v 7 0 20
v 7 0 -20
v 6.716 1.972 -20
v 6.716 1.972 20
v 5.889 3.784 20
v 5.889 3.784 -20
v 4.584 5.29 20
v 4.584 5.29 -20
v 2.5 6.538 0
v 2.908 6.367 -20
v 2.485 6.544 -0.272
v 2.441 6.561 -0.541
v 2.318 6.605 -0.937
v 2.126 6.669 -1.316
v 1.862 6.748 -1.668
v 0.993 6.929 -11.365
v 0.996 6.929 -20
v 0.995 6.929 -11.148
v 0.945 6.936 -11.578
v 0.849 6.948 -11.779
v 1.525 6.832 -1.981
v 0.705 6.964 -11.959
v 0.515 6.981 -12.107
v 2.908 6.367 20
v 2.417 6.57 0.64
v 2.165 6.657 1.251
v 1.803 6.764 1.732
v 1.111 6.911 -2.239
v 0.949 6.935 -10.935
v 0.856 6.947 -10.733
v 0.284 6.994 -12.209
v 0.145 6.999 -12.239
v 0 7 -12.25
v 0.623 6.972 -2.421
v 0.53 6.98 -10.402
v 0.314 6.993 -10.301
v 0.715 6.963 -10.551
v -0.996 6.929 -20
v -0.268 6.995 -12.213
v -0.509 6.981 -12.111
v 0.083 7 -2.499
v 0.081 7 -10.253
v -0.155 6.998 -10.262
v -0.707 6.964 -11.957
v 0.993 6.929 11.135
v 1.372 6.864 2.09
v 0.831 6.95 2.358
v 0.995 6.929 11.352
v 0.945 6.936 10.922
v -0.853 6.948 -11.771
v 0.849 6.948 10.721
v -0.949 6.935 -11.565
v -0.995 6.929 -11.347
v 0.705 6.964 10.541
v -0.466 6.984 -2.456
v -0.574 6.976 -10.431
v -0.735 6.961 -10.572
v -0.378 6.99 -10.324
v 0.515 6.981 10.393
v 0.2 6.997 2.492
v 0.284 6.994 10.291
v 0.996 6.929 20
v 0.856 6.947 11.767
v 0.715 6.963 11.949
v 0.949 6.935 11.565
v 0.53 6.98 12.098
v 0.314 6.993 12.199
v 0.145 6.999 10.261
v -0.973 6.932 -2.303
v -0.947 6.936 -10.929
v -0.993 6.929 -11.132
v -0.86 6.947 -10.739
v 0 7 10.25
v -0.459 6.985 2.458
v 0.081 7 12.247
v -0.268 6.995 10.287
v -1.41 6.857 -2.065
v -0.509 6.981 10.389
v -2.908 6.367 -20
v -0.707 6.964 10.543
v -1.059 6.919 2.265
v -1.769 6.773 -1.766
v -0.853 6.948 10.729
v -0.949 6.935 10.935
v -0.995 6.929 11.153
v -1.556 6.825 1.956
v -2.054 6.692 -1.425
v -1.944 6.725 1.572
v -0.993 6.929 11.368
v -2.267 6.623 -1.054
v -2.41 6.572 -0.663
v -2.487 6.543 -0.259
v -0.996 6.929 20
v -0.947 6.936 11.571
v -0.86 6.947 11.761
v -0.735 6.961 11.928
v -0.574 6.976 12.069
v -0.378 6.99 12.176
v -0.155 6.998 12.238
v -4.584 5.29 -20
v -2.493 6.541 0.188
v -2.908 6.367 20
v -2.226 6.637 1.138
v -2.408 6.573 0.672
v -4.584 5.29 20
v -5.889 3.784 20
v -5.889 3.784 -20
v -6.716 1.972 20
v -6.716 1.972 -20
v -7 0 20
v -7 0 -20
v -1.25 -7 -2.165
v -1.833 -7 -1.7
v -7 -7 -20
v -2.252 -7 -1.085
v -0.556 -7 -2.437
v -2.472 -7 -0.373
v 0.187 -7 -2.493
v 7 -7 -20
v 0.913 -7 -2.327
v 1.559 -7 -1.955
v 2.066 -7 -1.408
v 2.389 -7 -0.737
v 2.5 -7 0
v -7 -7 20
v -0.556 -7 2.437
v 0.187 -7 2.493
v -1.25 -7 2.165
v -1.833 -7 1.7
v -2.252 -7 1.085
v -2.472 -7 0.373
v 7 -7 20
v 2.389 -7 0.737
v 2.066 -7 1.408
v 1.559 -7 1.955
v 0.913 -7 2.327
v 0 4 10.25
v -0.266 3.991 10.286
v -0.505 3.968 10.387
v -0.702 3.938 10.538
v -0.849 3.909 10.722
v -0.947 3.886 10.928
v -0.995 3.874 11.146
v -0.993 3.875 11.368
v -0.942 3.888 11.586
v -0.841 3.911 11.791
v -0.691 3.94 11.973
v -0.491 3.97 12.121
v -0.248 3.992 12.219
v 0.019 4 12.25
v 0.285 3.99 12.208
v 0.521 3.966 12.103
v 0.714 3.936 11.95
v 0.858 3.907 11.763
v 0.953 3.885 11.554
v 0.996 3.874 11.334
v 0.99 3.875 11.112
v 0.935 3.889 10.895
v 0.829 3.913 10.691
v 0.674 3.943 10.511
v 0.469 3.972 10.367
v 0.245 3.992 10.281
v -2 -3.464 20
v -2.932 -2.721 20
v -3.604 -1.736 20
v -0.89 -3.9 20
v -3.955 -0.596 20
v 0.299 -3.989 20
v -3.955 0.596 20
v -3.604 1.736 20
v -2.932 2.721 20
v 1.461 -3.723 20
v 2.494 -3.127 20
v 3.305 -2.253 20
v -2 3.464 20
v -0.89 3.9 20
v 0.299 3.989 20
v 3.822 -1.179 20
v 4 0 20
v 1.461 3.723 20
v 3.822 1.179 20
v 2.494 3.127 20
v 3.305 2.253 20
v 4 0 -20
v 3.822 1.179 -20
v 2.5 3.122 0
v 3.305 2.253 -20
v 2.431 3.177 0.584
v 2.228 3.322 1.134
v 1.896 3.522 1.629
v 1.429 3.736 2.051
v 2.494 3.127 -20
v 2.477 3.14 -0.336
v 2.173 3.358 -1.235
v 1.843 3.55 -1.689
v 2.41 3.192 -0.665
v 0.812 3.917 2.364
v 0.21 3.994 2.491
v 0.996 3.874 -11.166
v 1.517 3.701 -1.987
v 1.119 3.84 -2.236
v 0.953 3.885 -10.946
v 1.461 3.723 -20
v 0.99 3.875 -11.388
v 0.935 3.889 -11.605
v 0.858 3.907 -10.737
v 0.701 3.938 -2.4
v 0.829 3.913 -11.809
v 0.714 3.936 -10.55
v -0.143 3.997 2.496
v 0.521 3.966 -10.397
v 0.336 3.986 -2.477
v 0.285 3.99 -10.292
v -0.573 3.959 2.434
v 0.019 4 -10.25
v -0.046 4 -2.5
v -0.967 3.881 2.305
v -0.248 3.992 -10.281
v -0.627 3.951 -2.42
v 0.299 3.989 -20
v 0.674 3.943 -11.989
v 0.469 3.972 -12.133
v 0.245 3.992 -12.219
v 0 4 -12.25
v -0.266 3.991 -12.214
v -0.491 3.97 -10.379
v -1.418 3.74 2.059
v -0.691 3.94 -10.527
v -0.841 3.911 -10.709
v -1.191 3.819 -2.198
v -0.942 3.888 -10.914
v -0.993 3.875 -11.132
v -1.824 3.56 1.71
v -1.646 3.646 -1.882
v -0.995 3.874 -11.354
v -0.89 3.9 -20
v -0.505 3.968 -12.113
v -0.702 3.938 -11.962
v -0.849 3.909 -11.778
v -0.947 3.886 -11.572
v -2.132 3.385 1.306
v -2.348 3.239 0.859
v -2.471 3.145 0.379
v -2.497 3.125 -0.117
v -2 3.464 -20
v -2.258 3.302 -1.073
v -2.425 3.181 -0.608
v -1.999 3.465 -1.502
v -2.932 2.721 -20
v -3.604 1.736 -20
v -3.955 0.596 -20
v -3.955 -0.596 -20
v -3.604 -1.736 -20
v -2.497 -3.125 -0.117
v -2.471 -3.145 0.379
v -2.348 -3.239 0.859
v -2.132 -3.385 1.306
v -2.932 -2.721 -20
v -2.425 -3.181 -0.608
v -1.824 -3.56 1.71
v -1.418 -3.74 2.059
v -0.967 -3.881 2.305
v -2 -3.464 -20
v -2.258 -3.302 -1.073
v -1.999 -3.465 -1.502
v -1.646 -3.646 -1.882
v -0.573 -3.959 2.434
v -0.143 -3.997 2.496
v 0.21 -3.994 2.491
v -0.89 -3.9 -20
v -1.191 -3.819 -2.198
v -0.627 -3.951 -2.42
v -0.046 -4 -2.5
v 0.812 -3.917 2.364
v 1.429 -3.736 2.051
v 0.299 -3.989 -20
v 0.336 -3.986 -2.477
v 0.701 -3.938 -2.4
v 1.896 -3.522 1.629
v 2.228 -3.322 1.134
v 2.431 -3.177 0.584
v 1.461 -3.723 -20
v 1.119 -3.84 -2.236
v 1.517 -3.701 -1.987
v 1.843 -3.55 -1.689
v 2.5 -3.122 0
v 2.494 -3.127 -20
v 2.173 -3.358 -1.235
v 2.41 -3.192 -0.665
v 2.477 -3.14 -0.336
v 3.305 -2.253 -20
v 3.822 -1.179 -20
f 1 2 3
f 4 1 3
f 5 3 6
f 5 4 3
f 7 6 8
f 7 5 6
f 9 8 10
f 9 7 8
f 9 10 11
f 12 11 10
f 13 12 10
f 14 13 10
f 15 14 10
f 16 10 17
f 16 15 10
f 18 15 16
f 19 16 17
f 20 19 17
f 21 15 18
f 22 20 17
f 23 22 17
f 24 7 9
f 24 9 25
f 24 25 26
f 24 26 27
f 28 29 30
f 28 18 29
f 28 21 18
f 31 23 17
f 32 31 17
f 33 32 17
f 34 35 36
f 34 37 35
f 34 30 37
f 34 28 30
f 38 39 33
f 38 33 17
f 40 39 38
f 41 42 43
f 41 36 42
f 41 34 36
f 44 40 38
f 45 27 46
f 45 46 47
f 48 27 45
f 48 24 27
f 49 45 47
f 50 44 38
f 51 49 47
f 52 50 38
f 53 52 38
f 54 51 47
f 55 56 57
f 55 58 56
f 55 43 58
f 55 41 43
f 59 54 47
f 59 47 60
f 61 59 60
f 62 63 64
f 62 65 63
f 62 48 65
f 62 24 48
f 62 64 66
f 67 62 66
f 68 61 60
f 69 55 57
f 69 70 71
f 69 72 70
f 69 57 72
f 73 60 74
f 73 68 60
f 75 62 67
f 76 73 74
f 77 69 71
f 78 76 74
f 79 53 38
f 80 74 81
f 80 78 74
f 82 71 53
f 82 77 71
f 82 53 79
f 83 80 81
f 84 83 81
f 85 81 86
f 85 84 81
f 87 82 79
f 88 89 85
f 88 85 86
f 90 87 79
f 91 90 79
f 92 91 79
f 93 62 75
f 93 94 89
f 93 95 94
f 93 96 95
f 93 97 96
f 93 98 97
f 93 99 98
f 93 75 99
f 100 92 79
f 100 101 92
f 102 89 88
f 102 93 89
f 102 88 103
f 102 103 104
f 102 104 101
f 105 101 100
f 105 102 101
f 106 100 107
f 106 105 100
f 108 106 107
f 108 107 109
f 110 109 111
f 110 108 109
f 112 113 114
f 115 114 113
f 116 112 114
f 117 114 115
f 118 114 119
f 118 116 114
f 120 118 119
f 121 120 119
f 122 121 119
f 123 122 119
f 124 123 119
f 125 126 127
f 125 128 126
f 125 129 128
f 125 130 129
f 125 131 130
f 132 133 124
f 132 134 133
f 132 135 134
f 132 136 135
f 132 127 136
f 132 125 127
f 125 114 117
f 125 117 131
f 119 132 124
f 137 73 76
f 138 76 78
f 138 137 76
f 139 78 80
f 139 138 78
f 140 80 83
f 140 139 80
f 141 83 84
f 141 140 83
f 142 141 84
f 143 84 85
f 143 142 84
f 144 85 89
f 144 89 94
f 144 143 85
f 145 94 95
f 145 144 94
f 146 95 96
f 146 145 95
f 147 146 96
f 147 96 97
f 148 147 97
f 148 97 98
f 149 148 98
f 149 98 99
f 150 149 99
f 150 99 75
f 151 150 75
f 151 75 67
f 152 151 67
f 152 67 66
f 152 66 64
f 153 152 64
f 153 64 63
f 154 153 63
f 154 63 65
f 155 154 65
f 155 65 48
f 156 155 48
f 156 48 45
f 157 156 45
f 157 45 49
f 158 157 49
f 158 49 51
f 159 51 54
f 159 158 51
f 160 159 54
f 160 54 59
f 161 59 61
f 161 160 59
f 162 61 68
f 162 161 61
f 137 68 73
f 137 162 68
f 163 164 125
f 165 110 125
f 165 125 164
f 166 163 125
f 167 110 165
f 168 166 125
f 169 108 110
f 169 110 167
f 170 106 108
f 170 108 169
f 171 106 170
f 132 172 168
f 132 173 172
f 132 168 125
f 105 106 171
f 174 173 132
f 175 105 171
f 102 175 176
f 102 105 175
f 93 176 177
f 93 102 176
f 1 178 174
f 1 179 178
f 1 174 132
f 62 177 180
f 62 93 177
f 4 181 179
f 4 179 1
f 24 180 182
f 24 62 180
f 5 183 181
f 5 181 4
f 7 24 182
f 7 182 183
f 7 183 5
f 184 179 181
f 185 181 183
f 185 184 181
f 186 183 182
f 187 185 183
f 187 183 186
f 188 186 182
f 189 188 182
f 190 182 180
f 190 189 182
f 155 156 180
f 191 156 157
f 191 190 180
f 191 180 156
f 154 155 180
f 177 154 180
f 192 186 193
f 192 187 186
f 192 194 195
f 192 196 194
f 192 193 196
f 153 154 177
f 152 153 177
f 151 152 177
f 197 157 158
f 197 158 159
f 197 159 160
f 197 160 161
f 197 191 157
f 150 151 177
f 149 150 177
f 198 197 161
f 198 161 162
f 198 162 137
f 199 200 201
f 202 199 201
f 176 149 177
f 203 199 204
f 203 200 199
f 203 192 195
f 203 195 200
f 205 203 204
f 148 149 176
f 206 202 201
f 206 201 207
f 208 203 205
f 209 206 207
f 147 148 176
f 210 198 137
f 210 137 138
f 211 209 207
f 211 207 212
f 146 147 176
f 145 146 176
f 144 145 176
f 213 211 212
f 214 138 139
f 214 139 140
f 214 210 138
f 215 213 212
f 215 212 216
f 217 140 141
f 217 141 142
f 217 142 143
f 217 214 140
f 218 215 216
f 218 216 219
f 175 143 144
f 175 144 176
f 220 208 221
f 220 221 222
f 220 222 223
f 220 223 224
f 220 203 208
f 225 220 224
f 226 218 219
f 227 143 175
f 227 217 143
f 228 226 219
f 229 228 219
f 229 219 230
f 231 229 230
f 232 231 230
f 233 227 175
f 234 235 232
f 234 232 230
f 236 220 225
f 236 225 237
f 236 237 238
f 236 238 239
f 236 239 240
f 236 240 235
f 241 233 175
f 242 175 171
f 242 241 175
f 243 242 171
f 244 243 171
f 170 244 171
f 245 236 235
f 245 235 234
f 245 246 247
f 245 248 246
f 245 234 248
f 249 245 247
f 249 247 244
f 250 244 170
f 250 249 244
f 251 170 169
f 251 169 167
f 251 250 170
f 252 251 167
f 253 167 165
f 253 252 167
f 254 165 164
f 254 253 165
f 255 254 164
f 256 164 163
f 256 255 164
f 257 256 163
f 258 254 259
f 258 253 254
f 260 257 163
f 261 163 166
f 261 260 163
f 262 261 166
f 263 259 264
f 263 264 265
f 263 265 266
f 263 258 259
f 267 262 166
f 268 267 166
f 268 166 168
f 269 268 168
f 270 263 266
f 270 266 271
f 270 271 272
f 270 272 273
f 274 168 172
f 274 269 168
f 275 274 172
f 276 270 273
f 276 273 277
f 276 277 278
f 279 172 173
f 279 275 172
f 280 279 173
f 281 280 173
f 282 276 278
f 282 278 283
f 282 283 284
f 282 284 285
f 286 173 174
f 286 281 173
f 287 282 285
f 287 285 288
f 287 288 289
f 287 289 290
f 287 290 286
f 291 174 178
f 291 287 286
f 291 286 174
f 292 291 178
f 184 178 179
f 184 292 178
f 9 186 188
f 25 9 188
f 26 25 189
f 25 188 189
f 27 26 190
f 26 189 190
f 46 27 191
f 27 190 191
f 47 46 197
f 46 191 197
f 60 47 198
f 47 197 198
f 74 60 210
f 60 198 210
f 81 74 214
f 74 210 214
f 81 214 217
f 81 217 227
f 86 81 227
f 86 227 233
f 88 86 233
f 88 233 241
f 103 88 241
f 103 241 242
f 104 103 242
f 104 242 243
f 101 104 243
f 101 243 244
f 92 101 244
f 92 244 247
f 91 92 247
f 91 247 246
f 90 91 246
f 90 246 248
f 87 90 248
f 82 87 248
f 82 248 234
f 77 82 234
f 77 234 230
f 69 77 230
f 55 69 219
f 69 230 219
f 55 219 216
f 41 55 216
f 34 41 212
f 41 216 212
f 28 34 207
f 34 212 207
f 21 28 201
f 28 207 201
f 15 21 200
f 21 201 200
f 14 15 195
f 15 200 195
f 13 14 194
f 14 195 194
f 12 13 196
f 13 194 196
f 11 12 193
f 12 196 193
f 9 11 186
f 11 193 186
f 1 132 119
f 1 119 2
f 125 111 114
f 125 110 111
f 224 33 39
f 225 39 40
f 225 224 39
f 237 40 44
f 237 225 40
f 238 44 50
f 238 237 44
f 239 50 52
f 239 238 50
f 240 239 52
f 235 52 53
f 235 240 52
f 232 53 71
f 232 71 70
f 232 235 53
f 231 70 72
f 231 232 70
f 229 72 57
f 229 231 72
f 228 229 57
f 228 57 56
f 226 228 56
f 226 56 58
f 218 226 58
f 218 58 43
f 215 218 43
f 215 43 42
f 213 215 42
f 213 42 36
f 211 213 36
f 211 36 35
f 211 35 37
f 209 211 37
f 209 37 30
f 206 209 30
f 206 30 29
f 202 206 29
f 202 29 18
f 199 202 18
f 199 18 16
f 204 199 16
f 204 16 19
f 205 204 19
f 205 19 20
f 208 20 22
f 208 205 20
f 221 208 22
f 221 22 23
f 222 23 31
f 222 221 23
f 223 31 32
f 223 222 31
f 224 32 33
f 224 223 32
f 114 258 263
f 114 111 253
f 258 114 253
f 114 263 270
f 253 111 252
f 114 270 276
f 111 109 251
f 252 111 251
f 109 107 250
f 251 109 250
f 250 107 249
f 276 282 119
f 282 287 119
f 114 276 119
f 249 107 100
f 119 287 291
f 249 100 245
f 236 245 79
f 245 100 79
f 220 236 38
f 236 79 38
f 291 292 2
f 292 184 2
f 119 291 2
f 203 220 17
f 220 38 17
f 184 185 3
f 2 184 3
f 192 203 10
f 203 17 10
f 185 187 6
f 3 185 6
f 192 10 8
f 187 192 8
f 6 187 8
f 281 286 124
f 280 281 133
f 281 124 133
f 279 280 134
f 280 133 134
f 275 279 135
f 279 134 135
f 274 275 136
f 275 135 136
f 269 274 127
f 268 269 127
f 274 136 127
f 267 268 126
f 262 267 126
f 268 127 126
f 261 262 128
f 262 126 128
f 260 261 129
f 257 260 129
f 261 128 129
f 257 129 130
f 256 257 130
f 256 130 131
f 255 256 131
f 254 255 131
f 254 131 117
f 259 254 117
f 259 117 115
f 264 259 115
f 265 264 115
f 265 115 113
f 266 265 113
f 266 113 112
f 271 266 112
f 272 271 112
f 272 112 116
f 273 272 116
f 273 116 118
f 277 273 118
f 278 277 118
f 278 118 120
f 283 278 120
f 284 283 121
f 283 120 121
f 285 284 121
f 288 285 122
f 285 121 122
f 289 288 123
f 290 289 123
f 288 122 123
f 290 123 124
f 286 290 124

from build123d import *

# Parameters (mm, degrees)
SKETCH1_R           = 4
BOSS_EXTRUDE1_DEPTH = 20
SKETCH2_R           = 2.5
CUT_EXTRUDE1_DEPTH  = 26.396850198
SKETCH3_R           = 1
CUT_EXTRUDE2_DEPTH  = 23.315913757


with BuildPart() as part:
    # Sketch1 → Boss-Extrude1 (new, symmetric)
    with BuildSketch(Plane.XY):
        with BuildLine():
            Line((-7, 0), (-7, -7))
            Line((-7, -7), (7, -7))
            Line((7, -7), (7, 0))
            ThreePointArc((7, 0), (0, 7), (-7, 0))
        make_face()
        Circle(SKETCH1_R, mode=Mode.SUBTRACT)
    extrude(amount=BOSS_EXTRUDE1_DEPTH, both=True)

    # Sketch2 → Cut-Extrude1 (cut, through all)
    with BuildSketch(Plane(origin=(0, -7, 0), x_dir=(-1, 0, 0), z_dir=(0, -1, 0))):
        with Locations(Location((0, 0, 0), (0, 0, 180))):
            Circle(SKETCH2_R)
    extrude(amount=-CUT_EXTRUDE1_DEPTH, mode=Mode.SUBTRACT)

    # Sketch3 → Cut-Extrude2 (cut, through all)
    with BuildSketch(Plane(origin=(0, 0, 0), x_dir=(1, 0, 0), z_dir=(0, 1, 0))):
        with Locations(Location((0, 11.25, 0), (0, 0, 90))):
            Circle(SKETCH3_R)
        with Locations(Location((0, -11.25, 0), (0, 0, 90))):
            Circle(SKETCH3_R)
    extrude(amount=CUT_EXTRUDE2_DEPTH, mode=Mode.SUBTRACT)


solid = part.part
